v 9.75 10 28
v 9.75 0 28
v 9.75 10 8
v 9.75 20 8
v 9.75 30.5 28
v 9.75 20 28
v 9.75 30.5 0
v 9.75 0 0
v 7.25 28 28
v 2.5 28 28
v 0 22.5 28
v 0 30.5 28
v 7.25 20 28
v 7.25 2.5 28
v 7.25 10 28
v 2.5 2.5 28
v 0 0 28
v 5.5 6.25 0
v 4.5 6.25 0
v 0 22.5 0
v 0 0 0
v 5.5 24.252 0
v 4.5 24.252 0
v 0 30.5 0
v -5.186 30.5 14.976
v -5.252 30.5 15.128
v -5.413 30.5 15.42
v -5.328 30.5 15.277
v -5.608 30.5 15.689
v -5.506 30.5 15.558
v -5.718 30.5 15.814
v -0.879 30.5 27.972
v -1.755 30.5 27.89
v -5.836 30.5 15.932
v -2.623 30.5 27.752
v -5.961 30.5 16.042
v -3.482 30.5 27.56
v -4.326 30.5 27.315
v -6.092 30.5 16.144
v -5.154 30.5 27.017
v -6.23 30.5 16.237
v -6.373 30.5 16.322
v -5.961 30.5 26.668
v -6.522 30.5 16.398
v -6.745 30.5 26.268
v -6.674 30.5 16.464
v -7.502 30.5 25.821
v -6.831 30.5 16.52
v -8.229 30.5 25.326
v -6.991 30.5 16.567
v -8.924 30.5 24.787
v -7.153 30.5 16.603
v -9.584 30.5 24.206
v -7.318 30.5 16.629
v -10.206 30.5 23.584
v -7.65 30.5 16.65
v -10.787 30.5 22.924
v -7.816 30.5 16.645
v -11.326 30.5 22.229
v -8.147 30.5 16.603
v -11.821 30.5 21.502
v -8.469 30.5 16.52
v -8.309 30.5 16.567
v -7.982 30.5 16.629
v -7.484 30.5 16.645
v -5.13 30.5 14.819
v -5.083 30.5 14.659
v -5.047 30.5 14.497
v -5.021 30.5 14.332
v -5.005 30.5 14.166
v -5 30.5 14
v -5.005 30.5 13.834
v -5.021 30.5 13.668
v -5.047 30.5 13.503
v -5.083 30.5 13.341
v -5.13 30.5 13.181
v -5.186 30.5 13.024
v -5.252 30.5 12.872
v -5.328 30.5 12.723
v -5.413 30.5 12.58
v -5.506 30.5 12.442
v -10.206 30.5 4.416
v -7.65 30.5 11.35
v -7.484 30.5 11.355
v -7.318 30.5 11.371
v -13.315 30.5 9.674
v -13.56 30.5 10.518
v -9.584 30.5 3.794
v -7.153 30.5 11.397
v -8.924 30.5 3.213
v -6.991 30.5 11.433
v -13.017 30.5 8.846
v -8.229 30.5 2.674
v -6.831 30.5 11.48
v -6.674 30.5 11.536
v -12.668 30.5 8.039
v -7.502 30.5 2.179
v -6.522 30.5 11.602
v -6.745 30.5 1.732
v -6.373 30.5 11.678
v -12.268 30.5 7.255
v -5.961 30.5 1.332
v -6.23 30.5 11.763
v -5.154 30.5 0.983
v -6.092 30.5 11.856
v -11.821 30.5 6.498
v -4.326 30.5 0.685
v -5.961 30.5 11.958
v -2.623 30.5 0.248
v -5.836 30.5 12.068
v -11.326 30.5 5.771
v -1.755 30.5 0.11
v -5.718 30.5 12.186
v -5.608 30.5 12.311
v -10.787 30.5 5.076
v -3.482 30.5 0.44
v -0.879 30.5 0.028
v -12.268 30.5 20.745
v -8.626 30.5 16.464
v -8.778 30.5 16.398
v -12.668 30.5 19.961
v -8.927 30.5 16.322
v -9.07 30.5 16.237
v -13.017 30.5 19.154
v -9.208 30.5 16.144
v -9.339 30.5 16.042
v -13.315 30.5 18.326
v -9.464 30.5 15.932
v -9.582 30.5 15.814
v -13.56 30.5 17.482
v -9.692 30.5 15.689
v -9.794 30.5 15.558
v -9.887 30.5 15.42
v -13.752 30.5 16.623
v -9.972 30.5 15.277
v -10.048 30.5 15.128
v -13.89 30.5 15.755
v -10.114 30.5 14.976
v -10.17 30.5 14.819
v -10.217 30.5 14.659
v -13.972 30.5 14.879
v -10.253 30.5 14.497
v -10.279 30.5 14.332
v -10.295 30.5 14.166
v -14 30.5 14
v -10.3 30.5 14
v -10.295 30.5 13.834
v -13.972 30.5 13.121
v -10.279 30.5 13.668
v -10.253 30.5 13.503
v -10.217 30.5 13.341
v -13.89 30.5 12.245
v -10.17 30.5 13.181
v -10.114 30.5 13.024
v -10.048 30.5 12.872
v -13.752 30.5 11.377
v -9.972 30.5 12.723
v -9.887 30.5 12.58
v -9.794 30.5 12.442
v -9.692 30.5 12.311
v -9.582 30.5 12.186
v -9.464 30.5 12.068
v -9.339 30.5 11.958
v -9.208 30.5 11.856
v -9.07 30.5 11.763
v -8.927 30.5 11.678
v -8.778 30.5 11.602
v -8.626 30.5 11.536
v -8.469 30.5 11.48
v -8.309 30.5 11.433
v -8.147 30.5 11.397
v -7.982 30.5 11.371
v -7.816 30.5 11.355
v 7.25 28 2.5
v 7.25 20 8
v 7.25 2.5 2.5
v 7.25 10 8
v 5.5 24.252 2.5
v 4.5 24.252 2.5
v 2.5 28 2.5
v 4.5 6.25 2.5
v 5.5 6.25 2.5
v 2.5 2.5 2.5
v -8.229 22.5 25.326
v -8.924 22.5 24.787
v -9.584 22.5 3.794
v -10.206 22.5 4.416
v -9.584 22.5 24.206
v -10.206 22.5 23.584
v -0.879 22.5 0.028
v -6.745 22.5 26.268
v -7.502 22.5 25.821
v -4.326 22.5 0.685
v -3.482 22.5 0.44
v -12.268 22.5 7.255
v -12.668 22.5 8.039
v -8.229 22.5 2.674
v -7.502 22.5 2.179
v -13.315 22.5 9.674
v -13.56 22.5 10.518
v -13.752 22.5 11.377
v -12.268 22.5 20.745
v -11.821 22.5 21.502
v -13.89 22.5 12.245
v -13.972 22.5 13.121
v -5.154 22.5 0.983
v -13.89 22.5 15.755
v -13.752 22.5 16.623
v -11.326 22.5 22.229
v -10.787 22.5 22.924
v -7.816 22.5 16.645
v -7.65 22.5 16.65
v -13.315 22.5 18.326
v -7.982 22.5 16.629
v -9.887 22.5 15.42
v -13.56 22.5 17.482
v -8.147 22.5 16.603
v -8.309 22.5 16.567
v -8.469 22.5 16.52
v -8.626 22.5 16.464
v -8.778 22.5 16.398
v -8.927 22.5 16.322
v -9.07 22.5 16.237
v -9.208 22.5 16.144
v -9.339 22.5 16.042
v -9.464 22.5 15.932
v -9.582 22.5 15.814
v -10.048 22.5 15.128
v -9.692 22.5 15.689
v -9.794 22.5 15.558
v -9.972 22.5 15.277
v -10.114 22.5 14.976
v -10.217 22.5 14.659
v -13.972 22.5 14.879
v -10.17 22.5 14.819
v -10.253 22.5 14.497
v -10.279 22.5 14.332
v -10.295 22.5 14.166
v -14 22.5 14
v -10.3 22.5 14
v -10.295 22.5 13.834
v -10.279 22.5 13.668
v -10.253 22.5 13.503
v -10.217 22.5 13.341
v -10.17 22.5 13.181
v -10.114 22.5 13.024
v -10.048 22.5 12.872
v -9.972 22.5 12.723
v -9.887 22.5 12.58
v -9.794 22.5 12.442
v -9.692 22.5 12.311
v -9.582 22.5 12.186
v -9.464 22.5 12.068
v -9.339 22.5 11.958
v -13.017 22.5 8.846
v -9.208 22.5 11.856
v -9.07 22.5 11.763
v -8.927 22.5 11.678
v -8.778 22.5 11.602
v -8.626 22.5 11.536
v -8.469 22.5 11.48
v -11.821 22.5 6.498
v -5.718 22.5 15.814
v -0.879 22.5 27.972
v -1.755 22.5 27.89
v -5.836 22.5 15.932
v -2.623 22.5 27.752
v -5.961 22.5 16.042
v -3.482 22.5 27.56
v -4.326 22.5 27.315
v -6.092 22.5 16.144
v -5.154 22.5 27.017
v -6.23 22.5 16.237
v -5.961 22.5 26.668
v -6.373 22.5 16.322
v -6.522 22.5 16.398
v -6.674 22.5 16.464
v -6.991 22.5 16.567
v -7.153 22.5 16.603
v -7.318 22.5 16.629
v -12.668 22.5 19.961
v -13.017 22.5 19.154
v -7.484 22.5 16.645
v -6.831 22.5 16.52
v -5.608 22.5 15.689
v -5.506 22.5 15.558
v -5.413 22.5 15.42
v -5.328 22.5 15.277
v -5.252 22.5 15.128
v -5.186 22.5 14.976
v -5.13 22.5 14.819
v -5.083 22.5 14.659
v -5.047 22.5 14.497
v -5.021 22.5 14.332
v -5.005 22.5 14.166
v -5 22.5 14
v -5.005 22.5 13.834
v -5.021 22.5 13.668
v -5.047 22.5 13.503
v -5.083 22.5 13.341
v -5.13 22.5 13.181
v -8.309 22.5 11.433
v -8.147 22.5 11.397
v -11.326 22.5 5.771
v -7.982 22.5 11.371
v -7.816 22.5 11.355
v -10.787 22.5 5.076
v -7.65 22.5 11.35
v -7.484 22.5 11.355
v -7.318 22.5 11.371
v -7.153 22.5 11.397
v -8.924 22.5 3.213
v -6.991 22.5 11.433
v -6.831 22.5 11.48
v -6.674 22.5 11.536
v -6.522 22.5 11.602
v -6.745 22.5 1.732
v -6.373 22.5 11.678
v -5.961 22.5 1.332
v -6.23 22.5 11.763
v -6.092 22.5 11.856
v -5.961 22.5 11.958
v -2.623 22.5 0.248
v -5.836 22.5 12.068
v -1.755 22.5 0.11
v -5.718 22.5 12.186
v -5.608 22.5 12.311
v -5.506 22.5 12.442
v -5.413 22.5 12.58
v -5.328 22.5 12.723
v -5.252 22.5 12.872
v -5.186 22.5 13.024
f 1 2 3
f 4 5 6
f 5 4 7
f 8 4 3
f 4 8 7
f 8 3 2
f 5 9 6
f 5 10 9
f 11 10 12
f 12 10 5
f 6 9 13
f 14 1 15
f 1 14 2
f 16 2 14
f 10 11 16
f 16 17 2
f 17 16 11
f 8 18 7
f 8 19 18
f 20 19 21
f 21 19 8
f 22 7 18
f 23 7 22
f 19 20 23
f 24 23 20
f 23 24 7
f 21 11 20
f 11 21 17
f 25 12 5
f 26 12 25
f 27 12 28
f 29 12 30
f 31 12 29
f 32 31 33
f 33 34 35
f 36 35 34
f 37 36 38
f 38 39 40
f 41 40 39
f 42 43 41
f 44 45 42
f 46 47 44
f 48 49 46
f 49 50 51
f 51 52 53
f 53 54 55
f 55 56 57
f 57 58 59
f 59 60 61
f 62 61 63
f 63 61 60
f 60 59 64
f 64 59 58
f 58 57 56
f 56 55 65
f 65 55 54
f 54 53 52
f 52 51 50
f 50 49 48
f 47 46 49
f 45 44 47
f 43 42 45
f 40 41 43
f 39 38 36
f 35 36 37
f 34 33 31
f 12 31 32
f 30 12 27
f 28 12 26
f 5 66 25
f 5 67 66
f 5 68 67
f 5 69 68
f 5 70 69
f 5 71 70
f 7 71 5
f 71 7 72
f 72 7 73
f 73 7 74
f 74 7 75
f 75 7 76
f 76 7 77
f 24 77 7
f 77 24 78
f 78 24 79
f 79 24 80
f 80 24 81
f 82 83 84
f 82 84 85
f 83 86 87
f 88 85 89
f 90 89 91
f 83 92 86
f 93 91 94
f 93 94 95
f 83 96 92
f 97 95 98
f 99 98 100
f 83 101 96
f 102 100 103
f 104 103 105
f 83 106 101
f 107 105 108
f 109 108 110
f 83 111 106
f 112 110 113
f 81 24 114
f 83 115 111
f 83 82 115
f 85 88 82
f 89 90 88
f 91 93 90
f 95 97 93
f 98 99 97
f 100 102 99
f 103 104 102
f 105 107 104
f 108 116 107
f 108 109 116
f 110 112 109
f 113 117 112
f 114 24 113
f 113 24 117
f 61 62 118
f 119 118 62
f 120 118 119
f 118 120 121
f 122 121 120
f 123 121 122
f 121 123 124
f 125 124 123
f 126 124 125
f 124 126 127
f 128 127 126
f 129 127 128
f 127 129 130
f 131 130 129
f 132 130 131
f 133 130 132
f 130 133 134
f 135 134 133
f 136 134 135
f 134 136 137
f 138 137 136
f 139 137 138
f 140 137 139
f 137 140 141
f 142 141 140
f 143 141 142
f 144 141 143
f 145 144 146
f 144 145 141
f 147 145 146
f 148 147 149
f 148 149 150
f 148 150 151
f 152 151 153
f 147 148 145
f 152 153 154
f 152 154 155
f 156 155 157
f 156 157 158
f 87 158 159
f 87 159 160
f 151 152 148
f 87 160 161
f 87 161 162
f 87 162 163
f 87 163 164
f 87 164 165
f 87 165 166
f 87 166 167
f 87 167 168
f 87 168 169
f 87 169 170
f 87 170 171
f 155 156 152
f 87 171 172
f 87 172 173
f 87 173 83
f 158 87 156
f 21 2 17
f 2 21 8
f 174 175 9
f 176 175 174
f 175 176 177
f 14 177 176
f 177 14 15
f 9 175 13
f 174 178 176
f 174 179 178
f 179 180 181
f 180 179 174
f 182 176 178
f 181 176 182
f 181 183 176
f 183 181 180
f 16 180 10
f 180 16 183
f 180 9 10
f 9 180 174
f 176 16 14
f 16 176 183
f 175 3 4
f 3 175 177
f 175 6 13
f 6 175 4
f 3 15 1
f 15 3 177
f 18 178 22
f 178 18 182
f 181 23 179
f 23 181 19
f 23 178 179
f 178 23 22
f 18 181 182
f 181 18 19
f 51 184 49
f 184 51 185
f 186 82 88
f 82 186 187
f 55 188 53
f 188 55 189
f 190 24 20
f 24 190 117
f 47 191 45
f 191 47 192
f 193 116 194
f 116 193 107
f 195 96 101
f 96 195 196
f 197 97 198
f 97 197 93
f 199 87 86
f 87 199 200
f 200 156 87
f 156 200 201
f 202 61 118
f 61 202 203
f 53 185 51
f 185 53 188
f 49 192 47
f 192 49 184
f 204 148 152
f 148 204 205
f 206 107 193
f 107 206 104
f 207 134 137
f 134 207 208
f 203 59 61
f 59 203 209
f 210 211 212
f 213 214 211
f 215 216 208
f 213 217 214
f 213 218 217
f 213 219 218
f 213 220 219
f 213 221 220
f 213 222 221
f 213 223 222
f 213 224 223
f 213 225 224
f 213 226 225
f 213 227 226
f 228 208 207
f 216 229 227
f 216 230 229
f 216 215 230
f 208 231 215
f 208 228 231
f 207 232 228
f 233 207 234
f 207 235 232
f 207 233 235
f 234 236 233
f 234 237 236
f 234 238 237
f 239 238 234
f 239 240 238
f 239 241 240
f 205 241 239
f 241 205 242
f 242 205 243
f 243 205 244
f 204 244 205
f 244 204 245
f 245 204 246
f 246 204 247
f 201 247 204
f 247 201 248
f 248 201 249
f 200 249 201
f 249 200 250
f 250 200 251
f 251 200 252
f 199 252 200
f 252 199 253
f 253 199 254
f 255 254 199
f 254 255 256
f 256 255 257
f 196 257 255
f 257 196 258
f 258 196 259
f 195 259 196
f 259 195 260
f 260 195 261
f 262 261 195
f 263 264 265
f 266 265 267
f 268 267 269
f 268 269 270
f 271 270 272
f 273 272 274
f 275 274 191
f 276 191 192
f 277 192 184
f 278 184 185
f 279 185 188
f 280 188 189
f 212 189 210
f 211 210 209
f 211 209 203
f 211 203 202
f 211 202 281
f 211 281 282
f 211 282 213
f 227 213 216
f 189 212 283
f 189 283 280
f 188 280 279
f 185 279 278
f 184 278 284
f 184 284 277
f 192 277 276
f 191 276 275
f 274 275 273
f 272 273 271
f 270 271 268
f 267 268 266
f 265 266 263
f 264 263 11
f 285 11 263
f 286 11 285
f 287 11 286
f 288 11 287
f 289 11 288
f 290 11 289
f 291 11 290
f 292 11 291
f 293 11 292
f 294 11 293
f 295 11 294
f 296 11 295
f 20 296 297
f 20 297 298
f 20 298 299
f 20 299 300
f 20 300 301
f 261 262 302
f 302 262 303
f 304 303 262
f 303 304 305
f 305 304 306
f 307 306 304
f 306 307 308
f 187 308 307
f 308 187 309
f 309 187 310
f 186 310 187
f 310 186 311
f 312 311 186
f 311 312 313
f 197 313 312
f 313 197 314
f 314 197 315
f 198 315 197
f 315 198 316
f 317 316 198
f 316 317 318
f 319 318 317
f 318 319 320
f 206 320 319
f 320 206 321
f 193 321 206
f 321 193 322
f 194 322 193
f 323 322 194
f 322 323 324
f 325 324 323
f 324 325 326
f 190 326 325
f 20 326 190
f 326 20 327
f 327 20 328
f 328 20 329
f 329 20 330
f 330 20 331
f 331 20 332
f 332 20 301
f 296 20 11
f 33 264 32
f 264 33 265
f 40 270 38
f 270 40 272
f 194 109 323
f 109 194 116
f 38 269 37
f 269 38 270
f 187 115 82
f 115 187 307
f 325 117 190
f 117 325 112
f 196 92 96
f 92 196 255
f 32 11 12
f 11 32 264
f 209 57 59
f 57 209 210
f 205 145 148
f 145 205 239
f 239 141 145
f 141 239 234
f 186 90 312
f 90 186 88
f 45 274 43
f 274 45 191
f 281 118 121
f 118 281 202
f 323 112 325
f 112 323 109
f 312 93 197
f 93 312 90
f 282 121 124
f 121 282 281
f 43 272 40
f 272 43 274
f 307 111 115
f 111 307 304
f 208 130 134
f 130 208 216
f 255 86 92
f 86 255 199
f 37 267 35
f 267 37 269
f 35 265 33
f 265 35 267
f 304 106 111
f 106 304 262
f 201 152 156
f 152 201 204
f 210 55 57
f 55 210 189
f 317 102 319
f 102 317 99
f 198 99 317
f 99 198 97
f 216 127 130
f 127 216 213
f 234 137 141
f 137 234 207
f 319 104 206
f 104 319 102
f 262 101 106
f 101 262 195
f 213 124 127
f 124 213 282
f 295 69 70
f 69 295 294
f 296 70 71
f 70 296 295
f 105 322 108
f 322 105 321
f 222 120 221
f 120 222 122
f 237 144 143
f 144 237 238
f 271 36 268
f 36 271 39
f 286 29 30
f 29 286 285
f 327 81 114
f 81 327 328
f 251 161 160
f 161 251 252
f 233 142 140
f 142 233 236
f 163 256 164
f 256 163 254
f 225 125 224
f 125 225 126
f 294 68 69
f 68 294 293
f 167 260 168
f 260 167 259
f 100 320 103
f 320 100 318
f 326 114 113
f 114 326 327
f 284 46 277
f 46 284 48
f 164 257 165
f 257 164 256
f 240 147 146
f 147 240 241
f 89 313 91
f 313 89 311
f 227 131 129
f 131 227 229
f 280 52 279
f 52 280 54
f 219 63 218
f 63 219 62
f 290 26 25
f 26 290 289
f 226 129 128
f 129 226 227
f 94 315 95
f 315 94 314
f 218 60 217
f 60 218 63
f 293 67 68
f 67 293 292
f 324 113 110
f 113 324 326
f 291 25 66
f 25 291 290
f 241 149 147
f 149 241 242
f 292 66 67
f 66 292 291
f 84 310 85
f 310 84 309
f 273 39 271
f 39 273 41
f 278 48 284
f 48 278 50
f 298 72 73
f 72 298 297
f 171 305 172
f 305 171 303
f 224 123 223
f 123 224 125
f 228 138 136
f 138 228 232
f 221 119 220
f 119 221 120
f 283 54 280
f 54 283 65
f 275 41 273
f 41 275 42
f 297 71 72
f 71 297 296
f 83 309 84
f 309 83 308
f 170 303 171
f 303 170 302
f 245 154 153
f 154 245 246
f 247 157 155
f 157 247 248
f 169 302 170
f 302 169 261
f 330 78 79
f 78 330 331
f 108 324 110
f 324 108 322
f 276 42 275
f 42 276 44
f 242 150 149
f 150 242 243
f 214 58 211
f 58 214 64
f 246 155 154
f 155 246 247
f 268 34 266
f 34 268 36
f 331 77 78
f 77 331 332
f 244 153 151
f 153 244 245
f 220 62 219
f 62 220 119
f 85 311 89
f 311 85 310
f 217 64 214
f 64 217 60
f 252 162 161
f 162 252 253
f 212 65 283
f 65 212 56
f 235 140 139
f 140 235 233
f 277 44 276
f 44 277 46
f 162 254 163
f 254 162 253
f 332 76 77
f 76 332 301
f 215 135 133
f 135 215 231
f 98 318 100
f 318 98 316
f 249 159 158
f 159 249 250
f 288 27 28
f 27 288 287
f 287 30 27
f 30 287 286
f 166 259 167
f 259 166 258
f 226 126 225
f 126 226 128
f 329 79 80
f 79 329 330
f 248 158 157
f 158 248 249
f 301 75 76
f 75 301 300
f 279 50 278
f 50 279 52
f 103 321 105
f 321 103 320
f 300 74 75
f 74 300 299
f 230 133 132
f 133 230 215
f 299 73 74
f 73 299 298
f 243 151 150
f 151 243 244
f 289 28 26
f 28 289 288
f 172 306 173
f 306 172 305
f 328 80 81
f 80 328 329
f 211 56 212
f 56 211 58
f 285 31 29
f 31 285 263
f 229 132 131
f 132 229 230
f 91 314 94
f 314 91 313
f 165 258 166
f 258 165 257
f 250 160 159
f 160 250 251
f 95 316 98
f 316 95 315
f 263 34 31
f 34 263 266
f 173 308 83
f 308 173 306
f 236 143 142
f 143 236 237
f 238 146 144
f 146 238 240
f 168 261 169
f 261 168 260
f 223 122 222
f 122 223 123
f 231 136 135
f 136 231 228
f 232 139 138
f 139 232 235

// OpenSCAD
//define geometry

board_width=25.5; //mm
board_height=23; //mm
board_thick=4.75; //mm
cable_width=18; //mm
cable_thick=1; //mm

side_cover=7.5; 

camera_hole_width=10;
camera_hole_height=5.5;

screw_hole_r=2.65;
wall_thk=2.5;
//create a fudge factor so no CSG operations have coincident faces
fudge=0.001;

mount_offset=2*wall_thk+board_width;
mount_thickness=8;

union(){

//camera holder
difference(){
    //create a box that is as thick as the board with wall thickness
    cube([board_thick+2*wall_thk, board_width+2*wall_thk, board_height+2*wall_thk]);
    //Subtract out area for the board to rest
    translate([wall_thk, wall_thk, wall_thk]) cube([board_thick, board_width, board_height+wall_thk+fudge]);
    //Subtract slot for camea lens
    translate([board_thick+wall_thk-fudge, wall_thk+side_cover, wall_thk+camera_hole_height]) cube([wall_thk+2*fudge, camera_hole_width, board_height+wall_thk-camera_hole_height+fudge]);
    //hole for cable in the bottom
    translate([wall_thk+2,wall_thk+(board_width-cable_width)/2,-fudge]) cube([cable_thick, cable_width+2*fudge, wall_thk+2*fudge]);
}

//mount
difference(){
    //body of mount is a cylinder
    union(){
        translate([0, mount_offset, board_height/2+wall_thk]) rotate([90,0,0]) cylinder(r=board_height/2+wall_thk, h=mount_thickness, $fn=100);
	//translate([-board_height/2-wall_thk,mount_offset-mount_thickness,0]) cube([board_height/2+wall_thk,mount_thickness-d,board_height/2+wall_thk]);
	}
    //remove circle sticking out front
    translate([fudge,0,0]) cube([50, board_width+2*wall_thk+fudge, board_height+2*wall_thk+fudge]);
    //add a hole for the M5 nut
    translate([-screw_hole_r-5,mount_offset+fudge, board_height/2+wall_thk]) rotate([90,0,0]) cylinder(r=screw_hole_r, h=mount_thickness+2*fudge, $fn=100);
}

}
